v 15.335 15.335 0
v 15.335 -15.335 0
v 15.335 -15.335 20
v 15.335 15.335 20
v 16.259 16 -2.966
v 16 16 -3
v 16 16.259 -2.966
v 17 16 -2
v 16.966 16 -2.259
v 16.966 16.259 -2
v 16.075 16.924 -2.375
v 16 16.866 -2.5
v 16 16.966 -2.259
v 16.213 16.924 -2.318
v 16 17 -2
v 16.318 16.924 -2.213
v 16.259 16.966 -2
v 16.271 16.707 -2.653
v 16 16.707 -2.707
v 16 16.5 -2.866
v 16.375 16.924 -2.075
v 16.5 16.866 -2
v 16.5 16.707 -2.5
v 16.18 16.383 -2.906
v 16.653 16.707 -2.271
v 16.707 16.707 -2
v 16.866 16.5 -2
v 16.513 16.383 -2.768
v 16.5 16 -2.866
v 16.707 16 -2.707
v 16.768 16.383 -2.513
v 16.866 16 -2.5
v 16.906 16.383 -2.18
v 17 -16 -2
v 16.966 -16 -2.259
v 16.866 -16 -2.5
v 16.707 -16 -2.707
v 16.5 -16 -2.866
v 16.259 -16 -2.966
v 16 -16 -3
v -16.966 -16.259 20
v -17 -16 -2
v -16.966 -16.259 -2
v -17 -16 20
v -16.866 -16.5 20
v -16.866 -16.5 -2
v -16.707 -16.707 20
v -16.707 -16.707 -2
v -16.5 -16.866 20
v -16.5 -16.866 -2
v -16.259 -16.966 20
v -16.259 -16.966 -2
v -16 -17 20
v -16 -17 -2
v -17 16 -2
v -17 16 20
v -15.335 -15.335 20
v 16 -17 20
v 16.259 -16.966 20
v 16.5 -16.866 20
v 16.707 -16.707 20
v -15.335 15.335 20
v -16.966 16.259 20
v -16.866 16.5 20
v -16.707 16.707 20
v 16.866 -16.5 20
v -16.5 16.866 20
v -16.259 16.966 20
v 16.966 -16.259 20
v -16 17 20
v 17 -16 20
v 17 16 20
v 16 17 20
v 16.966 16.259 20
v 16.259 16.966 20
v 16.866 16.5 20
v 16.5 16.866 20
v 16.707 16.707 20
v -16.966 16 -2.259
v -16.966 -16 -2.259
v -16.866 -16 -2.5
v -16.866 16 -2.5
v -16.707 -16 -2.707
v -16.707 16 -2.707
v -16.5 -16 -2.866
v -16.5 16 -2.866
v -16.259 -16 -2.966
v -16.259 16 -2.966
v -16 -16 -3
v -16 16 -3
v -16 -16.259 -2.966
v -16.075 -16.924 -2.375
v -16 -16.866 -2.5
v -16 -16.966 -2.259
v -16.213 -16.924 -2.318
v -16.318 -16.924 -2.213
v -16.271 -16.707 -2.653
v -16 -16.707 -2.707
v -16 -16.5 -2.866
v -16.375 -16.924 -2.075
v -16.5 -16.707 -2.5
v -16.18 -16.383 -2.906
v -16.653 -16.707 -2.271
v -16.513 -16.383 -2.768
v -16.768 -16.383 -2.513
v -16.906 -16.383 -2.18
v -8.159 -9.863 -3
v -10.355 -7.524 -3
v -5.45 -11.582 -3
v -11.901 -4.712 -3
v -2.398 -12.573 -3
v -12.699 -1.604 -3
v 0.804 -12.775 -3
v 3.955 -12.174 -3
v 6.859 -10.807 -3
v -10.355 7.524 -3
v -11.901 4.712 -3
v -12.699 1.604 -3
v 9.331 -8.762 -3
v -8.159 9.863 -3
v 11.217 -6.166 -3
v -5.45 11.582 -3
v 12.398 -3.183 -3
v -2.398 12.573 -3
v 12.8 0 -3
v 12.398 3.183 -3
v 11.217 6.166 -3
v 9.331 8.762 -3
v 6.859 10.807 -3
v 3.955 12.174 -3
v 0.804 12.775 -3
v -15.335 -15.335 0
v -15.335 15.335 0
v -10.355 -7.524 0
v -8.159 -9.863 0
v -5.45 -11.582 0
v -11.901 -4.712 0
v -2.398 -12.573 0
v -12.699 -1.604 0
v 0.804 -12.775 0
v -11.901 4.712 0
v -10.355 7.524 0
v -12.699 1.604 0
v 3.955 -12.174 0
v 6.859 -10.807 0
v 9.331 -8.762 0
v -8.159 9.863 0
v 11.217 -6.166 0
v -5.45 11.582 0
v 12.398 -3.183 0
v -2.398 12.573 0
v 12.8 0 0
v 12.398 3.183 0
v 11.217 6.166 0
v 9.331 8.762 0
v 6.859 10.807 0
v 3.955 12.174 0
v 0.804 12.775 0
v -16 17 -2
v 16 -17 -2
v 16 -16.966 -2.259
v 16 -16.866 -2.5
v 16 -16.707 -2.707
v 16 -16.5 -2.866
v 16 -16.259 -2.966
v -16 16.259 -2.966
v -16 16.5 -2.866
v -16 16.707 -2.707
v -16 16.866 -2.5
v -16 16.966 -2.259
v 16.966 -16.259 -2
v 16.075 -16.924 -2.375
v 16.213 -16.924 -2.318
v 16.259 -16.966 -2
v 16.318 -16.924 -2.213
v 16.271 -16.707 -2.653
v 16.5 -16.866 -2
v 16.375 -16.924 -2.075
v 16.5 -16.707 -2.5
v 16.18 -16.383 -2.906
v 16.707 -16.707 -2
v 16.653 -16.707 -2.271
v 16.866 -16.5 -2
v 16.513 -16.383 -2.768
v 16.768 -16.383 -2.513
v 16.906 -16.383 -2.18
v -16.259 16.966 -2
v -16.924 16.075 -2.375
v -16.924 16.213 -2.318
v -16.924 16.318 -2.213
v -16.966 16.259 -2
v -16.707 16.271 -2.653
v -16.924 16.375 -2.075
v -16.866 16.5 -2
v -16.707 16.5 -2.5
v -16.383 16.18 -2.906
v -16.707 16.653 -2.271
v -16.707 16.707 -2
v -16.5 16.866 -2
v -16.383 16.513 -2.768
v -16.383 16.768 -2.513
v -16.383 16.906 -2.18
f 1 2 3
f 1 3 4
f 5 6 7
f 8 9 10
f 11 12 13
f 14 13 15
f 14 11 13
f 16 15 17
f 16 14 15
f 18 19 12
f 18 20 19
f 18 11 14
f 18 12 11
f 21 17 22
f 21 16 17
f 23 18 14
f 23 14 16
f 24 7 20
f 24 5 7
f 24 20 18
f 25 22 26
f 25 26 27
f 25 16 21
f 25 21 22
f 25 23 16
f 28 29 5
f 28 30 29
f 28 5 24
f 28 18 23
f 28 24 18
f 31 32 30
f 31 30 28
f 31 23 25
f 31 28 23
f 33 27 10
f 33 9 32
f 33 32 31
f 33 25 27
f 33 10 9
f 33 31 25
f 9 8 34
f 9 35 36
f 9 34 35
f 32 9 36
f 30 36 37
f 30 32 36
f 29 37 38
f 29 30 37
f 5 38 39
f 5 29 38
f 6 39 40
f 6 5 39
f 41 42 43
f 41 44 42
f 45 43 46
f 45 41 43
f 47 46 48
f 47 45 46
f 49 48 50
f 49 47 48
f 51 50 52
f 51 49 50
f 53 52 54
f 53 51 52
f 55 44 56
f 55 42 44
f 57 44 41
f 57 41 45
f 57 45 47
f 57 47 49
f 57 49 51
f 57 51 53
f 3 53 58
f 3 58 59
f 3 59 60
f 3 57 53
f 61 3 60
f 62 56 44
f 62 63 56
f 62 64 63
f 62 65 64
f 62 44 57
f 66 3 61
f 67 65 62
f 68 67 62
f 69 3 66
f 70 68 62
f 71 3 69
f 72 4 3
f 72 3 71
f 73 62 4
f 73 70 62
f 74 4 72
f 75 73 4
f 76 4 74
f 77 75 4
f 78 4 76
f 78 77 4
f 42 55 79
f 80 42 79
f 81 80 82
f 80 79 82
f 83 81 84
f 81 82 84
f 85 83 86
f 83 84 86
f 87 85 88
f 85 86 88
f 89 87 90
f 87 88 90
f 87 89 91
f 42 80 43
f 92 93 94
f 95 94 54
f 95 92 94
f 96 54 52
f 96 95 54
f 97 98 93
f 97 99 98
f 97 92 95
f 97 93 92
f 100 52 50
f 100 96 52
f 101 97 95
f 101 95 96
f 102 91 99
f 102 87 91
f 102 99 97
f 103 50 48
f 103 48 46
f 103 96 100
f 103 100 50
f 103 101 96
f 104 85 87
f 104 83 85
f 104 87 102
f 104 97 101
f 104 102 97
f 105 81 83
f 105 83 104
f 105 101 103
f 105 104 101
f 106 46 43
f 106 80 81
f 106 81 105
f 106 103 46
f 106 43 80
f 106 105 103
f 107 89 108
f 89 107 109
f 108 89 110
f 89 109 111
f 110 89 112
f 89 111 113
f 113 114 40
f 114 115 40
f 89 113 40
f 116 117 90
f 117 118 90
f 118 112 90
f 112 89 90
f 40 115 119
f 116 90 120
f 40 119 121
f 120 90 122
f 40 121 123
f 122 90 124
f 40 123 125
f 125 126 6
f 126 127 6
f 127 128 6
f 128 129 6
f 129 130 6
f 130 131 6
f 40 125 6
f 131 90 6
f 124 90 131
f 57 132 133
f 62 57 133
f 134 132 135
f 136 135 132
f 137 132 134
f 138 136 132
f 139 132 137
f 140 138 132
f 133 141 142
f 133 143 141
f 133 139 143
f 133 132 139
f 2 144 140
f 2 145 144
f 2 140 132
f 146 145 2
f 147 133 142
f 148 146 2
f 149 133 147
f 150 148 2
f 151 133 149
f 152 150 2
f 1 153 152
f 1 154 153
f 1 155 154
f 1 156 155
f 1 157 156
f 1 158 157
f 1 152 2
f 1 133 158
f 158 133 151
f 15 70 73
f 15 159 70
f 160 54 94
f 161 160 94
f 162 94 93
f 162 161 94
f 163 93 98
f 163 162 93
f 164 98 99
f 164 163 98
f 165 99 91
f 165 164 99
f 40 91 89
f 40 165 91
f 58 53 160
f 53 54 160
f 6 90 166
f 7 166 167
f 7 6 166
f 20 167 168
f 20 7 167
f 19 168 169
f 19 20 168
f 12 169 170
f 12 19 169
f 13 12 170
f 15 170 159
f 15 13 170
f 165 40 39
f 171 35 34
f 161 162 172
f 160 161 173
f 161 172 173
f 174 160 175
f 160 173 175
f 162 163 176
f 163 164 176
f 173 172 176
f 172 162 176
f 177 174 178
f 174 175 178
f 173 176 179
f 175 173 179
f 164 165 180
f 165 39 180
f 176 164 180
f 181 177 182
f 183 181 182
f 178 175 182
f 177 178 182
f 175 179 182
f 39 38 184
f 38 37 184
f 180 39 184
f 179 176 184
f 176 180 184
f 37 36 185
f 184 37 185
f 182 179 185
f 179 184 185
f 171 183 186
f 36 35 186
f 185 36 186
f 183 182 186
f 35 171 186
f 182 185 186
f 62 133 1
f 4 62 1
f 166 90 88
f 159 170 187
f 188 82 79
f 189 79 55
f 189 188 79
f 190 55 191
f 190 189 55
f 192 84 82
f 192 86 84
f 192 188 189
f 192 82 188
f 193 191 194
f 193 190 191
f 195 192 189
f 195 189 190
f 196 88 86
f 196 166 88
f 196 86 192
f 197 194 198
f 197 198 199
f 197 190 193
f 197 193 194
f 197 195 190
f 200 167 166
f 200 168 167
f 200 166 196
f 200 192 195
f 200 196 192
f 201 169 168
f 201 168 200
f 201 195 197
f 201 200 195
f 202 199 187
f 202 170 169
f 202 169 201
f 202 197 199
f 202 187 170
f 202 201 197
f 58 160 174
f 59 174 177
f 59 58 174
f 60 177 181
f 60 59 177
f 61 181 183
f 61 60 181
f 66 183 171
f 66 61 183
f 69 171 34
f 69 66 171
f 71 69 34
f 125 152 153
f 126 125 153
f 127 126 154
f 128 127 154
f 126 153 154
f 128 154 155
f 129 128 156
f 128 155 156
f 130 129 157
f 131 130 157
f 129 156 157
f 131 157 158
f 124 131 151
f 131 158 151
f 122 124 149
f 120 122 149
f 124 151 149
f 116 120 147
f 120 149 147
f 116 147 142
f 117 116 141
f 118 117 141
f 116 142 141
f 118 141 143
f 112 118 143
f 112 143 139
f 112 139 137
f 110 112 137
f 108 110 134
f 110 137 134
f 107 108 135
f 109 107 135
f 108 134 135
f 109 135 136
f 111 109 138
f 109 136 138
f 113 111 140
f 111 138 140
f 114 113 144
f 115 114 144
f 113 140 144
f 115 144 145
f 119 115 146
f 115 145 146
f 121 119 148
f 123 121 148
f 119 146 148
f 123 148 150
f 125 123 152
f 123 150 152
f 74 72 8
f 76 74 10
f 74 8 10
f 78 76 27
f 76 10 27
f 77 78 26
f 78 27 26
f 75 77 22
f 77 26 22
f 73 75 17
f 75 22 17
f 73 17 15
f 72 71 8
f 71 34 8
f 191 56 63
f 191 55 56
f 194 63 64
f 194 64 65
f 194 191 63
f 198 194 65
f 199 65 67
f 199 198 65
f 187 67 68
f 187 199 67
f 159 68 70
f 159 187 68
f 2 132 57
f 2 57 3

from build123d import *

# Parameters (mm, degrees)
F0_W     = 34
F0_H     = 34
F0_W_2   = 30.67
F0_H_2   = 30.67
F0_R     = 14.3
F0_R_2   = 12.8
F1_DEPTH = 3
F2_DEPTH = 20
F3_R     = 1


with BuildPart() as f1:
    # F0 (on Top) → F1 (new body)
    with BuildSketch(Plane.XY):
        Rectangle(F0_W, F0_H)
        Rectangle(F0_W_2, F0_H_2, mode=Mode.SUBTRACT)
        Rectangle(F0_W_2, F0_H_2)
        Circle(F0_R, mode=Mode.SUBTRACT)
        Circle(F0_R)
        Circle(F0_R_2, mode=Mode.SUBTRACT)
    extrude(amount=-F1_DEPTH)

    # F0 (on Top) → F2 (join)
    with BuildSketch(Plane.XY):
        Rectangle(F0_W, F0_H)
        Rectangle(F0_W_2, F0_H_2, mode=Mode.SUBTRACT)
    extrude(amount=F2_DEPTH)

    # F3
    f3_edges = [f1.edges().sort_by_distance(p)[0] for p in [
        (17, 0, -3),
        (0, 17, -3),
        (-17, 0, -3),
        (0, -17, -3),
        (17, -17, 8.5),
        (17, 17, 8.5),
        (-17, 17, 8.5),
        (-17, -17, 8.5),
    ]]
    fillet(f3_edges, radius=F3_R)


solid = f1.part
